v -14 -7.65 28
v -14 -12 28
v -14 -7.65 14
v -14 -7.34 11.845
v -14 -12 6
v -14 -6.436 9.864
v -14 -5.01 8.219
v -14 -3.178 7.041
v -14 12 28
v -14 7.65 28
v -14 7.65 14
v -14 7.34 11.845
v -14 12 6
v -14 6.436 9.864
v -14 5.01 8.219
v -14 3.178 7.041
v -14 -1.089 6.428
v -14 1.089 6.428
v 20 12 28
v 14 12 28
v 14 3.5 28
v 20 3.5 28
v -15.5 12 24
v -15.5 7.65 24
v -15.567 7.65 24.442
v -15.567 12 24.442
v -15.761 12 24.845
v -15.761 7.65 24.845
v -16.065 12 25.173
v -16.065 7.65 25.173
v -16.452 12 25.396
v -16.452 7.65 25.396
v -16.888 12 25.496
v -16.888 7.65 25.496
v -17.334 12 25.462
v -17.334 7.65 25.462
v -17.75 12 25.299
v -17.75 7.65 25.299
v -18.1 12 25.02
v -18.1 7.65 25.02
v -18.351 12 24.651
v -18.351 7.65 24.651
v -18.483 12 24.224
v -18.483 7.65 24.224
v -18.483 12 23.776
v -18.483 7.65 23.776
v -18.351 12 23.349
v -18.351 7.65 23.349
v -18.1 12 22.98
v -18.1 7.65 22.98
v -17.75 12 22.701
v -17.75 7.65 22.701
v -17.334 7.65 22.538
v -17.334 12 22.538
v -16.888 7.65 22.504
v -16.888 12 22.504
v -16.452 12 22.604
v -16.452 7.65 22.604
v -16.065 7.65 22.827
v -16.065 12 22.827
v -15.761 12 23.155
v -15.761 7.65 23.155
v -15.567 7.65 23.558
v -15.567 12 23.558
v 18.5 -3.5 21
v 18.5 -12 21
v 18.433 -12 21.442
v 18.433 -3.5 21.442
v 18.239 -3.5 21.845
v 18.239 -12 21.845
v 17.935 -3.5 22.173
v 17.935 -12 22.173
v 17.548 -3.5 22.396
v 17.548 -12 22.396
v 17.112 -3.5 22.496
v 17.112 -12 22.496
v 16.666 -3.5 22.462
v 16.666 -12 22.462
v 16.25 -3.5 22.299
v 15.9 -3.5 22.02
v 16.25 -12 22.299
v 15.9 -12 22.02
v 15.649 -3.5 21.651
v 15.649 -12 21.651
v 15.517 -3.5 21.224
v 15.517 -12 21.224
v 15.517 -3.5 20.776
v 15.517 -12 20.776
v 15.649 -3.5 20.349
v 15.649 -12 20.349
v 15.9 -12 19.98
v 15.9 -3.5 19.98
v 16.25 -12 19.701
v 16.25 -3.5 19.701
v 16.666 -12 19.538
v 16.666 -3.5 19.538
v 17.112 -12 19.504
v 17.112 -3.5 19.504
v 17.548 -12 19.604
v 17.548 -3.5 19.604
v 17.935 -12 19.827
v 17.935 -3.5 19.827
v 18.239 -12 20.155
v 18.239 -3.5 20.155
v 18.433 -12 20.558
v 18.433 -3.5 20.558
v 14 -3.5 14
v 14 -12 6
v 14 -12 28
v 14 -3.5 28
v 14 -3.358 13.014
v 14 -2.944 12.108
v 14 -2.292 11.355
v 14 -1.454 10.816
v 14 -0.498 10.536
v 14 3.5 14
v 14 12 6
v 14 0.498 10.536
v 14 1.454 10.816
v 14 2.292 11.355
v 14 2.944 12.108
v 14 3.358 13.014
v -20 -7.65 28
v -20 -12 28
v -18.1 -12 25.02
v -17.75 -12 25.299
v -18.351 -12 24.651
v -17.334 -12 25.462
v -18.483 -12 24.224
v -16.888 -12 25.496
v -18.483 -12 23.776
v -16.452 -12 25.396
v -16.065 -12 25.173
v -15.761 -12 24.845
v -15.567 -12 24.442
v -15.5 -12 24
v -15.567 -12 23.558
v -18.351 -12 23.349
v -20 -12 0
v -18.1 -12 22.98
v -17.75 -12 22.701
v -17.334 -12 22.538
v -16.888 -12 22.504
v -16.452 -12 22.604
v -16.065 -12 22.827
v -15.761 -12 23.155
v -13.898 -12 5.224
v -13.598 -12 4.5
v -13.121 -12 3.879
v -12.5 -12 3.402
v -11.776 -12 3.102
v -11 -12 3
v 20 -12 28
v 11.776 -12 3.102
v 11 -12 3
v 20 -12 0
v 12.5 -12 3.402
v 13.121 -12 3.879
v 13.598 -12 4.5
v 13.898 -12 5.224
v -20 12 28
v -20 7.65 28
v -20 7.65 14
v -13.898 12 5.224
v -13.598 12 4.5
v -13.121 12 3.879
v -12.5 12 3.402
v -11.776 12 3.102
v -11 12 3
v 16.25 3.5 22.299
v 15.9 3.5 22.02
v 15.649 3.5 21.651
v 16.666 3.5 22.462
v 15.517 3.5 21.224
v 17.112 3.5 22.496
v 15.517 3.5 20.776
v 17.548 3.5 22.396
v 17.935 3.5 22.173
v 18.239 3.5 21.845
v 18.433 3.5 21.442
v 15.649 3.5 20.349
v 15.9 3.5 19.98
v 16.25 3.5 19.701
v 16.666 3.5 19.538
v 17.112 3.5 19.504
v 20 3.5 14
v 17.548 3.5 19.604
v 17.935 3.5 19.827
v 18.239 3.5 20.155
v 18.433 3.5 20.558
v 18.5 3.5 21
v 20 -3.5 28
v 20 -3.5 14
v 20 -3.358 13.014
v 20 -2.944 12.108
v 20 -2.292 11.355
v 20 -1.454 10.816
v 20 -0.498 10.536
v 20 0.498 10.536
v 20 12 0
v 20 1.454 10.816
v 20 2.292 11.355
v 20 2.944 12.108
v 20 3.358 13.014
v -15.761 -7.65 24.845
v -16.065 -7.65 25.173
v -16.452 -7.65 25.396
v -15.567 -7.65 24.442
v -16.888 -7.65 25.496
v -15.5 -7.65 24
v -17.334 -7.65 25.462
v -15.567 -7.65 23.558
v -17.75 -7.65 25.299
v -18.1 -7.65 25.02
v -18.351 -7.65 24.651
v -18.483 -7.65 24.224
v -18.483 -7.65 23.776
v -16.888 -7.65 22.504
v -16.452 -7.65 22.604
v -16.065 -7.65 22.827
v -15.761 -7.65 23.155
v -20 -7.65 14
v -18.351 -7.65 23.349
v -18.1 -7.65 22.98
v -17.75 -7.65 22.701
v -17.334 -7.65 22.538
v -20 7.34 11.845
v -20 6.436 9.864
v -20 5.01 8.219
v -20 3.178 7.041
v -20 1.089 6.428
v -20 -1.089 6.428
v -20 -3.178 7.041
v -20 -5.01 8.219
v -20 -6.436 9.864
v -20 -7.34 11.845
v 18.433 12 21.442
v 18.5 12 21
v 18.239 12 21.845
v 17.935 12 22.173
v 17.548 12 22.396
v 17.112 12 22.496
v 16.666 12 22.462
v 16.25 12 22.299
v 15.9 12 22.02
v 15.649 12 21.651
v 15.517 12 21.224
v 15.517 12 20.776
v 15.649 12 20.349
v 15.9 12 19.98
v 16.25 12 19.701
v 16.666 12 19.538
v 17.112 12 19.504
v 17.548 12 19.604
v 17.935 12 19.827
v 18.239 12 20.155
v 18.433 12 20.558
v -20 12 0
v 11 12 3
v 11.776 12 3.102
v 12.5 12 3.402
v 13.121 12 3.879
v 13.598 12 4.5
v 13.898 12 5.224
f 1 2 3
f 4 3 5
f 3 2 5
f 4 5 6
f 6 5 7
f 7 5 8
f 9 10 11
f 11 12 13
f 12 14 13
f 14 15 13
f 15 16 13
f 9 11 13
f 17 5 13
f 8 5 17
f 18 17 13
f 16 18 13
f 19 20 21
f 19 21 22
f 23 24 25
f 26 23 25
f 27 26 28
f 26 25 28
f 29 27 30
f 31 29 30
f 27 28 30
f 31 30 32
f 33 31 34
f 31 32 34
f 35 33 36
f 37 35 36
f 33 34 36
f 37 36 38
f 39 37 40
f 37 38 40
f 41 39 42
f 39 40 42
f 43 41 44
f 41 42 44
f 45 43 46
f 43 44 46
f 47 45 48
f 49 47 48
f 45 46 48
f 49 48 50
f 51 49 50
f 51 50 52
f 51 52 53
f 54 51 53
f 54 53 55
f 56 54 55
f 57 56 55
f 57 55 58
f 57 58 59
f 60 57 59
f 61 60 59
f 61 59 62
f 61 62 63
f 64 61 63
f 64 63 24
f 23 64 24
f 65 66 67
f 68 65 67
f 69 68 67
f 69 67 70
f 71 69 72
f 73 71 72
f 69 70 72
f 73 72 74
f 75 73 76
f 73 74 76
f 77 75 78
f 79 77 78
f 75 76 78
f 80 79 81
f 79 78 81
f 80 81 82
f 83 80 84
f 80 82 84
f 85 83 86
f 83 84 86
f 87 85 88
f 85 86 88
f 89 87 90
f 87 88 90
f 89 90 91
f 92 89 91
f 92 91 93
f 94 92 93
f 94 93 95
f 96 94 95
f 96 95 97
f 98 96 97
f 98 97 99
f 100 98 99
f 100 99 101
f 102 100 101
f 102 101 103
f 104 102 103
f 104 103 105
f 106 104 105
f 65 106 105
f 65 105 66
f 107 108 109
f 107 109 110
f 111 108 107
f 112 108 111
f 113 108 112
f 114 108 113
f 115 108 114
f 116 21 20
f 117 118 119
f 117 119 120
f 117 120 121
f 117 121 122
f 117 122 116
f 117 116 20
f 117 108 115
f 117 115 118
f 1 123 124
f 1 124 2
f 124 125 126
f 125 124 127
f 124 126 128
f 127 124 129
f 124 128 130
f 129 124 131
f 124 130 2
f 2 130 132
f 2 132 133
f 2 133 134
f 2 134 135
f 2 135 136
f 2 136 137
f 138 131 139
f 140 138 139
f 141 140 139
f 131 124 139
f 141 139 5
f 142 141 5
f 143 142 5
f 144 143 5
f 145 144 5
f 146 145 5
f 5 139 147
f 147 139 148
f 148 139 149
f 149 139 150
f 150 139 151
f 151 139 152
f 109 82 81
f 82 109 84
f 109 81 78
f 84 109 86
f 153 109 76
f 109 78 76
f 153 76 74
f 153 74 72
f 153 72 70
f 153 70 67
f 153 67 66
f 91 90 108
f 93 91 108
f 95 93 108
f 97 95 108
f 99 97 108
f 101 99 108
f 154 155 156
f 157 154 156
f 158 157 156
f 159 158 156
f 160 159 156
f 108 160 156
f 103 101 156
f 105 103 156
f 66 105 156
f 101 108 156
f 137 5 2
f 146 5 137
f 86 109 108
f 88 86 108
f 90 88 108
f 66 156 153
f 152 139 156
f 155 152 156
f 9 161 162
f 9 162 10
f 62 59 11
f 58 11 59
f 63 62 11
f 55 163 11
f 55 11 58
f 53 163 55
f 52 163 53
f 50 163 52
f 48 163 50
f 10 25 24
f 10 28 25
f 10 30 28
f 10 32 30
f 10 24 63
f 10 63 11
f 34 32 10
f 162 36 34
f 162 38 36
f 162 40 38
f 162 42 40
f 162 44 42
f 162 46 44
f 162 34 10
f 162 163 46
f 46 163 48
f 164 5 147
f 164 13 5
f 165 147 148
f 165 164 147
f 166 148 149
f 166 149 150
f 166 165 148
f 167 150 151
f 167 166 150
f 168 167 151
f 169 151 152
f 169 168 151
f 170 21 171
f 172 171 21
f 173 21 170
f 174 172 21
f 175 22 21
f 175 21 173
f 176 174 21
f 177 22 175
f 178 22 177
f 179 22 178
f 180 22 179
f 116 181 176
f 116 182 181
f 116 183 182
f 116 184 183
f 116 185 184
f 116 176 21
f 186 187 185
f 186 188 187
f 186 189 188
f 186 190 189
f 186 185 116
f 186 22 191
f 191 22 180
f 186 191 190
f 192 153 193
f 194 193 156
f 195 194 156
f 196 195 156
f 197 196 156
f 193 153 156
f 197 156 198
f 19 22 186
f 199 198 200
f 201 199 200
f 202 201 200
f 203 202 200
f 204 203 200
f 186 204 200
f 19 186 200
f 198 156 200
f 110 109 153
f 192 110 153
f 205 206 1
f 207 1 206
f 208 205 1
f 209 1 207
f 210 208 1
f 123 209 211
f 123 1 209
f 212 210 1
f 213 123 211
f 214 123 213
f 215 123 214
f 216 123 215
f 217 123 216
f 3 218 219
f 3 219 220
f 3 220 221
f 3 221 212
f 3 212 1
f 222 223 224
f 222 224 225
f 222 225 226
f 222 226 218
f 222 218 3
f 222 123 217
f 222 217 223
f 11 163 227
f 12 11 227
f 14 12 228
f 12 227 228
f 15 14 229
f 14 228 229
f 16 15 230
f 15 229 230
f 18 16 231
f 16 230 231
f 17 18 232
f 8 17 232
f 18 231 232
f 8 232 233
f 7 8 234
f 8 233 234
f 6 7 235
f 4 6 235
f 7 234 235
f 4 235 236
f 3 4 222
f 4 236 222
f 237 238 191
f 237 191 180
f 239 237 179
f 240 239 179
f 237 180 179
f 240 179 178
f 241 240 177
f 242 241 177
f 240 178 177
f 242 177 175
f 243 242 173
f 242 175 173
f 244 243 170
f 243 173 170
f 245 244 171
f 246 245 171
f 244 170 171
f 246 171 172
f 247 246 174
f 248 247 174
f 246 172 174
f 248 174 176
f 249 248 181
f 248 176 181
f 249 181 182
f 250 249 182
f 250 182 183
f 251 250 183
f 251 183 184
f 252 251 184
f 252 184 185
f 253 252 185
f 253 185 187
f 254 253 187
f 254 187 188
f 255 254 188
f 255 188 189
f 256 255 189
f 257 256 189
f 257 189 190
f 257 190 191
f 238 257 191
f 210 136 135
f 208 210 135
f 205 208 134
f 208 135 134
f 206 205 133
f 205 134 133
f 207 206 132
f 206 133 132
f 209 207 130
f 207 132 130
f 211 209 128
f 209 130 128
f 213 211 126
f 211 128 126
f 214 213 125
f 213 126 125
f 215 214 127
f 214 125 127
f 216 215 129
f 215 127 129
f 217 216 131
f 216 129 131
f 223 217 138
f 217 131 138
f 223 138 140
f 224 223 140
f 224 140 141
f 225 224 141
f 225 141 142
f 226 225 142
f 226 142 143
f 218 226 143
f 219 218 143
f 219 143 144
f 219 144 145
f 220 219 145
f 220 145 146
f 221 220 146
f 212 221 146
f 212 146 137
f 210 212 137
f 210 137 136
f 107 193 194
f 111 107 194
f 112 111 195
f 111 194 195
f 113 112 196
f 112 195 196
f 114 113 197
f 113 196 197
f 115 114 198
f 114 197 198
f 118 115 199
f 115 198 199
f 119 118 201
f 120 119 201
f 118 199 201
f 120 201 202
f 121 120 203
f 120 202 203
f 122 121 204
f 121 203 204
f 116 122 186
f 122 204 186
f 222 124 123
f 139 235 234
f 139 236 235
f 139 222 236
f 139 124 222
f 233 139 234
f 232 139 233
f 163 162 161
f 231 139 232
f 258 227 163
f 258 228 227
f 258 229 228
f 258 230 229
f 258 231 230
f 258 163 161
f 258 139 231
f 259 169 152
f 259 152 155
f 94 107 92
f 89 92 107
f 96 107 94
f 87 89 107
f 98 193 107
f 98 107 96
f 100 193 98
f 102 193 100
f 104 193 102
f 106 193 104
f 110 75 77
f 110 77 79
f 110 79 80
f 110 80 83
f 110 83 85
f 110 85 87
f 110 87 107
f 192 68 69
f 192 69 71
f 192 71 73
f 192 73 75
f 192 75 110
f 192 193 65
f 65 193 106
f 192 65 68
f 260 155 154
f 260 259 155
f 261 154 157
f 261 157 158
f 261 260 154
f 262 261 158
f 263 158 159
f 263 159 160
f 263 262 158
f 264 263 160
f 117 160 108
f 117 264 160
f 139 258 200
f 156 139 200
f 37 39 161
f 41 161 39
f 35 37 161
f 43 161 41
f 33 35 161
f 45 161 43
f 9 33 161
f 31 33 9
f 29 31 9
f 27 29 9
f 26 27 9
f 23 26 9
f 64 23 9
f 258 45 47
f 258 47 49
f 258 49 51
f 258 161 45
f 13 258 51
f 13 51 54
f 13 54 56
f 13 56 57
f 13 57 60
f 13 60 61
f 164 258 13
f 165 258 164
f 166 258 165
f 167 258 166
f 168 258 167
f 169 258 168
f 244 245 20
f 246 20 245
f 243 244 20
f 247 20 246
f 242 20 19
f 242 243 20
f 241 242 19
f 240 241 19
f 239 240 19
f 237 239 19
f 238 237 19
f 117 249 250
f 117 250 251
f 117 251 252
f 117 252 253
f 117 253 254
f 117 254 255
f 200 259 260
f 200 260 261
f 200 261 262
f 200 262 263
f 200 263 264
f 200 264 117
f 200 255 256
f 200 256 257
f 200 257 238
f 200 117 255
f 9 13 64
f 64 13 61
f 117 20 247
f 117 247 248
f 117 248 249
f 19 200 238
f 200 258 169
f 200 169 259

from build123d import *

# Parameters (mm, degrees)
SKETCH_W        = 40
SKETCH_H        = 24
PAD_DEPTH       = 3
SKETCH001_W     = 6
SKETCH001_H     = 24
PAD001_DEPTH    = 25
POCKET_DEPTH    = 6
POCKET001_DEPTH = 6
SKETCH005_R     = 1.5
POCKET002_DEPTH = 24.001
FILLET_R        = 3


with BuildPart() as part:
    # Sketch → Pad (new body)
    with BuildSketch(Plane.XY):
        Rectangle(SKETCH_W, SKETCH_H)
    extrude(amount=PAD_DEPTH)

    # Sketch001 (on Face6 of Pad) → Pad001 (join)
    with BuildSketch(Plane.XY.offset(3)):
        with Locations((-17, 0)):
            Rectangle(SKETCH001_W, SKETCH001_H)
        with Locations((17, 0)):
            Rectangle(SKETCH001_W, SKETCH001_H)
    extrude(amount=PAD001_DEPTH)

    # Sketch002 (on Face9 of Pad001) → Pocket (cut)
    with BuildSketch(Plane.YZ.offset(20)):
        with BuildLine():
            Line((-3.5, 28), (3.5, 28))
            Line((3.5, 28), (3.5, 13.999995))
            ThreePointArc((-3.5, 13.999984), (5e-06, 10.5), (3.5, 13.999995))
            Line((-3.5, 13.999984), (-3.5, 28))
        make_face()
    extrude(amount=-POCKET_DEPTH, mode=Mode.SUBTRACT)

    # Sketch004 (on Face12 of Pocket) → Pocket001 (cut)
    with BuildSketch(Plane(origin=(-20, 0, 0), x_dir=(0, -1, 0), z_dir=(-1, 0, 0))):
        with BuildLine():
            Line((-7.65, 28), (7.65, 28))
            Line((7.65, 28), (7.65, 14))
            ThreePointArc((-7.65, 14), (0, 6.35), (7.65, 14))
            Line((-7.65, 14), (-7.65, 28))
        make_face()
    extrude(amount=-POCKET001_DEPTH, mode=Mode.SUBTRACT)

    # Sketch005 (on Face10 of Pocket001) → Pocket002 (cut, through all)
    with BuildSketch(Plane.XZ.offset(12)):
        with Locations((17, 21)):
            Circle(SKETCH005_R)
        with Locations((-17, 24)):
            Circle(SKETCH005_R)
    extrude(amount=-POCKET002_DEPTH, mode=Mode.SUBTRACT)

    # Fillet
    fillet_edges = [part.edges().sort_by_distance(p)[0] for p in [
        (-14, 0, 3),
        (14, 0, 3),
    ]]
    fillet(fillet_edges, radius=FILLET_R)


solid = part.part
